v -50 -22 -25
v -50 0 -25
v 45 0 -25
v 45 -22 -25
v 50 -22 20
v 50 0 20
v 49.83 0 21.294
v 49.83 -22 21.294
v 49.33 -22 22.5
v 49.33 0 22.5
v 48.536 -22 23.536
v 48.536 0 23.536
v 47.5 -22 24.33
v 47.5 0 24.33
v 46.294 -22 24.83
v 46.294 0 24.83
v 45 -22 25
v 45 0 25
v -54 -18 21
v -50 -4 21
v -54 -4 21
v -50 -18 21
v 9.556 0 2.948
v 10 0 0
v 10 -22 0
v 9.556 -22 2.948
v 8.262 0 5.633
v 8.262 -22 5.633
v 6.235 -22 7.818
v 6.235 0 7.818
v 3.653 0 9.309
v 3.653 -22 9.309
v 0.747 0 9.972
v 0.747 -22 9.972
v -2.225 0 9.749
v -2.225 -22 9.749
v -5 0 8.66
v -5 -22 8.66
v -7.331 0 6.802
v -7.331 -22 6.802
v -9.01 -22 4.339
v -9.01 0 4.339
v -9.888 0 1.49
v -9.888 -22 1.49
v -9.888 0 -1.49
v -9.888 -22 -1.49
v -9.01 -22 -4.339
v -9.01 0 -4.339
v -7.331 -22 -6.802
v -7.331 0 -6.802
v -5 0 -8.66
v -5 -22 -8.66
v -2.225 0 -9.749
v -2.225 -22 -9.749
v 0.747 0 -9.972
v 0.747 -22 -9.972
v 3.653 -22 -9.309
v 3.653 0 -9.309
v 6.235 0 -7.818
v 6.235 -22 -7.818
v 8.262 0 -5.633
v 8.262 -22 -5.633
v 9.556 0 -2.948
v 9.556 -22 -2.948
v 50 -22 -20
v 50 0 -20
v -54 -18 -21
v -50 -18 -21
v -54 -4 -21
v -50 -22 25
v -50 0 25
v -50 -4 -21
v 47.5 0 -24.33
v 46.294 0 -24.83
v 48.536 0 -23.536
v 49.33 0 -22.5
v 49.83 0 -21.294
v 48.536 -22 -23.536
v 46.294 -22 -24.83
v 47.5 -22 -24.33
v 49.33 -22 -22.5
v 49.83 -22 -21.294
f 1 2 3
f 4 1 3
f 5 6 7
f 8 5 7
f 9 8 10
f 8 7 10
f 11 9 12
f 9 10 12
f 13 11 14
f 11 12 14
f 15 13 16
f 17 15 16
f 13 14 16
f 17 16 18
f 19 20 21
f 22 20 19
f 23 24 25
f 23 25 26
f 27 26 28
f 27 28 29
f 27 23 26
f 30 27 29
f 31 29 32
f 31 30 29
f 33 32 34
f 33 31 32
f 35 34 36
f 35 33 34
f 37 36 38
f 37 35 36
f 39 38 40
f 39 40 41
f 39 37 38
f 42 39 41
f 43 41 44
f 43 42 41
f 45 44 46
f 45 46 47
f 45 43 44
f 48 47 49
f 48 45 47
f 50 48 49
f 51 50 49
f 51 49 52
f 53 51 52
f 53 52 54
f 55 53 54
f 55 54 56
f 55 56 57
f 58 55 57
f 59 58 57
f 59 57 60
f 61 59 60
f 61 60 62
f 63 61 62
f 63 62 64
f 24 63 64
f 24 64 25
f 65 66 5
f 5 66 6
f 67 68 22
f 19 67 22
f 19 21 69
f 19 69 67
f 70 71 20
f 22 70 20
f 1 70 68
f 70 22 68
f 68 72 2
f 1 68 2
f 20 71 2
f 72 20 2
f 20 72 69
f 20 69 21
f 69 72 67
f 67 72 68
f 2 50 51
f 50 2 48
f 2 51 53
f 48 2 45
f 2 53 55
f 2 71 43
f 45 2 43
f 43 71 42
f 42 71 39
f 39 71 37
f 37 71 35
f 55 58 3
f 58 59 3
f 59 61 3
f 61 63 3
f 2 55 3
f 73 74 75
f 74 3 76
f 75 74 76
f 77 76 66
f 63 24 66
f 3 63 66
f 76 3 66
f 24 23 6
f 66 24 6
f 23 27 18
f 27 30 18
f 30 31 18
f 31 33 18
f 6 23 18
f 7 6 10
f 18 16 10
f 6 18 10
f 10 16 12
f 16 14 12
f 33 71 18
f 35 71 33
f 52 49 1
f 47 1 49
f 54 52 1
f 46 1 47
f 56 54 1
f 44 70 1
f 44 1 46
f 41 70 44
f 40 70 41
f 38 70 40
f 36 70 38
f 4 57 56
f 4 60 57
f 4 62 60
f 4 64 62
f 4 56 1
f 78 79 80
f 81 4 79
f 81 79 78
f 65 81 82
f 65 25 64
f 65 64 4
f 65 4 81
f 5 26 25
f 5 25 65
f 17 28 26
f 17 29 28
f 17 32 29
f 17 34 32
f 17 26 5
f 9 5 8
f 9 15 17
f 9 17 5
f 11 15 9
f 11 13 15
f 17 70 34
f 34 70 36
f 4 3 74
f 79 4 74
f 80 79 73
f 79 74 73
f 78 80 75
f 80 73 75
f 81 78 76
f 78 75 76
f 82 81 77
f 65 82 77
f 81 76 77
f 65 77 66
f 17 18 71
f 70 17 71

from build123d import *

# Parameters (mm, degrees)
F0_R      = 10
F1_DEPTH  = 20
F1_FACE_R = 10
F2_DEPTH  = 2
F3_W      = 14
F3_H      = 42
F4_DEPTH  = 4


# Not quite as in the source:
# - the program builds the solid bodies; features that only make, move or delete a surface that nothing else refers to are left out


with BuildPart() as f1:
    # F0 (on Front) → F1 (new body)
    with BuildSketch(Plane.XZ):
        with BuildLine():
            Line((45, 25), (-50, 25))
            Line((-50, 25), (-50, -25))
            Line((-50, -25), (45, -25))
            ThreePointArc((45, -25), (48.5355339059, -23.5355339059), (50, -20))
            Line((50, -20), (50, 20))
            ThreePointArc((50, 20), (48.5355339059, 23.5355339059), (45, 25))
        make_face()
        Circle(F0_R, mode=Mode.SUBTRACT)
    extrude(amount=F1_DEPTH)

    # F0 (on Front) + F1_face (on face) → F2 (join)
    with BuildSketch(Plane.XZ):
        with BuildLine():
            Line((45, 25), (-50, 25))
            Line((-50, 25), (-50, -25))
            Line((-50, -25), (45, -25))
            ThreePointArc((45, -25), (48.5355339059, -23.5355339059), (50, -20))
            Line((50, -20), (50, 20))
            ThreePointArc((50, 20), (48.5355339059, 23.5355339059), (45, 25))
        make_face()
        Circle(F0_R, mode=Mode.SUBTRACT)
    with BuildSketch(Plane(origin=(-0.1121943071, -20, 0), x_dir=(1, 0, 0), z_dir=(0, -1, 0))):
        with BuildLine():
            Line((45.1121943071, 25), (-49.8878056929, 25))
            Line((-49.8878056929, 25), (-49.8878056929, -25))
            Line((-49.8878056929, -25), (45.1121943071, -25))
            ThreePointArc((45.1121943071, -25), (48.647728213, -23.5355339059), (50.1121943071, -20))
            Line((50.1121943071, -20), (50.1121943071, 20))
            ThreePointArc((50.1121943071, 20), (48.647728213, 23.5355339059), (45.1121943071, 25))
        make_face()
        with Locations((0.1121943071, 0)):
            Circle(F1_FACE_R, mode=Mode.SUBTRACT)
    extrude(amount=F2_DEPTH)

    # F3 (on face) → F4 (join)
    with BuildSketch(Plane(origin=(-50, 0, 0), x_dir=(0, -1, 0), z_dir=(-1, 0, 0))):
        with Locations((11, 0)):
            Rectangle(F3_W, F3_H)
    extrude(amount=F4_DEPTH)


solid = f1.part
